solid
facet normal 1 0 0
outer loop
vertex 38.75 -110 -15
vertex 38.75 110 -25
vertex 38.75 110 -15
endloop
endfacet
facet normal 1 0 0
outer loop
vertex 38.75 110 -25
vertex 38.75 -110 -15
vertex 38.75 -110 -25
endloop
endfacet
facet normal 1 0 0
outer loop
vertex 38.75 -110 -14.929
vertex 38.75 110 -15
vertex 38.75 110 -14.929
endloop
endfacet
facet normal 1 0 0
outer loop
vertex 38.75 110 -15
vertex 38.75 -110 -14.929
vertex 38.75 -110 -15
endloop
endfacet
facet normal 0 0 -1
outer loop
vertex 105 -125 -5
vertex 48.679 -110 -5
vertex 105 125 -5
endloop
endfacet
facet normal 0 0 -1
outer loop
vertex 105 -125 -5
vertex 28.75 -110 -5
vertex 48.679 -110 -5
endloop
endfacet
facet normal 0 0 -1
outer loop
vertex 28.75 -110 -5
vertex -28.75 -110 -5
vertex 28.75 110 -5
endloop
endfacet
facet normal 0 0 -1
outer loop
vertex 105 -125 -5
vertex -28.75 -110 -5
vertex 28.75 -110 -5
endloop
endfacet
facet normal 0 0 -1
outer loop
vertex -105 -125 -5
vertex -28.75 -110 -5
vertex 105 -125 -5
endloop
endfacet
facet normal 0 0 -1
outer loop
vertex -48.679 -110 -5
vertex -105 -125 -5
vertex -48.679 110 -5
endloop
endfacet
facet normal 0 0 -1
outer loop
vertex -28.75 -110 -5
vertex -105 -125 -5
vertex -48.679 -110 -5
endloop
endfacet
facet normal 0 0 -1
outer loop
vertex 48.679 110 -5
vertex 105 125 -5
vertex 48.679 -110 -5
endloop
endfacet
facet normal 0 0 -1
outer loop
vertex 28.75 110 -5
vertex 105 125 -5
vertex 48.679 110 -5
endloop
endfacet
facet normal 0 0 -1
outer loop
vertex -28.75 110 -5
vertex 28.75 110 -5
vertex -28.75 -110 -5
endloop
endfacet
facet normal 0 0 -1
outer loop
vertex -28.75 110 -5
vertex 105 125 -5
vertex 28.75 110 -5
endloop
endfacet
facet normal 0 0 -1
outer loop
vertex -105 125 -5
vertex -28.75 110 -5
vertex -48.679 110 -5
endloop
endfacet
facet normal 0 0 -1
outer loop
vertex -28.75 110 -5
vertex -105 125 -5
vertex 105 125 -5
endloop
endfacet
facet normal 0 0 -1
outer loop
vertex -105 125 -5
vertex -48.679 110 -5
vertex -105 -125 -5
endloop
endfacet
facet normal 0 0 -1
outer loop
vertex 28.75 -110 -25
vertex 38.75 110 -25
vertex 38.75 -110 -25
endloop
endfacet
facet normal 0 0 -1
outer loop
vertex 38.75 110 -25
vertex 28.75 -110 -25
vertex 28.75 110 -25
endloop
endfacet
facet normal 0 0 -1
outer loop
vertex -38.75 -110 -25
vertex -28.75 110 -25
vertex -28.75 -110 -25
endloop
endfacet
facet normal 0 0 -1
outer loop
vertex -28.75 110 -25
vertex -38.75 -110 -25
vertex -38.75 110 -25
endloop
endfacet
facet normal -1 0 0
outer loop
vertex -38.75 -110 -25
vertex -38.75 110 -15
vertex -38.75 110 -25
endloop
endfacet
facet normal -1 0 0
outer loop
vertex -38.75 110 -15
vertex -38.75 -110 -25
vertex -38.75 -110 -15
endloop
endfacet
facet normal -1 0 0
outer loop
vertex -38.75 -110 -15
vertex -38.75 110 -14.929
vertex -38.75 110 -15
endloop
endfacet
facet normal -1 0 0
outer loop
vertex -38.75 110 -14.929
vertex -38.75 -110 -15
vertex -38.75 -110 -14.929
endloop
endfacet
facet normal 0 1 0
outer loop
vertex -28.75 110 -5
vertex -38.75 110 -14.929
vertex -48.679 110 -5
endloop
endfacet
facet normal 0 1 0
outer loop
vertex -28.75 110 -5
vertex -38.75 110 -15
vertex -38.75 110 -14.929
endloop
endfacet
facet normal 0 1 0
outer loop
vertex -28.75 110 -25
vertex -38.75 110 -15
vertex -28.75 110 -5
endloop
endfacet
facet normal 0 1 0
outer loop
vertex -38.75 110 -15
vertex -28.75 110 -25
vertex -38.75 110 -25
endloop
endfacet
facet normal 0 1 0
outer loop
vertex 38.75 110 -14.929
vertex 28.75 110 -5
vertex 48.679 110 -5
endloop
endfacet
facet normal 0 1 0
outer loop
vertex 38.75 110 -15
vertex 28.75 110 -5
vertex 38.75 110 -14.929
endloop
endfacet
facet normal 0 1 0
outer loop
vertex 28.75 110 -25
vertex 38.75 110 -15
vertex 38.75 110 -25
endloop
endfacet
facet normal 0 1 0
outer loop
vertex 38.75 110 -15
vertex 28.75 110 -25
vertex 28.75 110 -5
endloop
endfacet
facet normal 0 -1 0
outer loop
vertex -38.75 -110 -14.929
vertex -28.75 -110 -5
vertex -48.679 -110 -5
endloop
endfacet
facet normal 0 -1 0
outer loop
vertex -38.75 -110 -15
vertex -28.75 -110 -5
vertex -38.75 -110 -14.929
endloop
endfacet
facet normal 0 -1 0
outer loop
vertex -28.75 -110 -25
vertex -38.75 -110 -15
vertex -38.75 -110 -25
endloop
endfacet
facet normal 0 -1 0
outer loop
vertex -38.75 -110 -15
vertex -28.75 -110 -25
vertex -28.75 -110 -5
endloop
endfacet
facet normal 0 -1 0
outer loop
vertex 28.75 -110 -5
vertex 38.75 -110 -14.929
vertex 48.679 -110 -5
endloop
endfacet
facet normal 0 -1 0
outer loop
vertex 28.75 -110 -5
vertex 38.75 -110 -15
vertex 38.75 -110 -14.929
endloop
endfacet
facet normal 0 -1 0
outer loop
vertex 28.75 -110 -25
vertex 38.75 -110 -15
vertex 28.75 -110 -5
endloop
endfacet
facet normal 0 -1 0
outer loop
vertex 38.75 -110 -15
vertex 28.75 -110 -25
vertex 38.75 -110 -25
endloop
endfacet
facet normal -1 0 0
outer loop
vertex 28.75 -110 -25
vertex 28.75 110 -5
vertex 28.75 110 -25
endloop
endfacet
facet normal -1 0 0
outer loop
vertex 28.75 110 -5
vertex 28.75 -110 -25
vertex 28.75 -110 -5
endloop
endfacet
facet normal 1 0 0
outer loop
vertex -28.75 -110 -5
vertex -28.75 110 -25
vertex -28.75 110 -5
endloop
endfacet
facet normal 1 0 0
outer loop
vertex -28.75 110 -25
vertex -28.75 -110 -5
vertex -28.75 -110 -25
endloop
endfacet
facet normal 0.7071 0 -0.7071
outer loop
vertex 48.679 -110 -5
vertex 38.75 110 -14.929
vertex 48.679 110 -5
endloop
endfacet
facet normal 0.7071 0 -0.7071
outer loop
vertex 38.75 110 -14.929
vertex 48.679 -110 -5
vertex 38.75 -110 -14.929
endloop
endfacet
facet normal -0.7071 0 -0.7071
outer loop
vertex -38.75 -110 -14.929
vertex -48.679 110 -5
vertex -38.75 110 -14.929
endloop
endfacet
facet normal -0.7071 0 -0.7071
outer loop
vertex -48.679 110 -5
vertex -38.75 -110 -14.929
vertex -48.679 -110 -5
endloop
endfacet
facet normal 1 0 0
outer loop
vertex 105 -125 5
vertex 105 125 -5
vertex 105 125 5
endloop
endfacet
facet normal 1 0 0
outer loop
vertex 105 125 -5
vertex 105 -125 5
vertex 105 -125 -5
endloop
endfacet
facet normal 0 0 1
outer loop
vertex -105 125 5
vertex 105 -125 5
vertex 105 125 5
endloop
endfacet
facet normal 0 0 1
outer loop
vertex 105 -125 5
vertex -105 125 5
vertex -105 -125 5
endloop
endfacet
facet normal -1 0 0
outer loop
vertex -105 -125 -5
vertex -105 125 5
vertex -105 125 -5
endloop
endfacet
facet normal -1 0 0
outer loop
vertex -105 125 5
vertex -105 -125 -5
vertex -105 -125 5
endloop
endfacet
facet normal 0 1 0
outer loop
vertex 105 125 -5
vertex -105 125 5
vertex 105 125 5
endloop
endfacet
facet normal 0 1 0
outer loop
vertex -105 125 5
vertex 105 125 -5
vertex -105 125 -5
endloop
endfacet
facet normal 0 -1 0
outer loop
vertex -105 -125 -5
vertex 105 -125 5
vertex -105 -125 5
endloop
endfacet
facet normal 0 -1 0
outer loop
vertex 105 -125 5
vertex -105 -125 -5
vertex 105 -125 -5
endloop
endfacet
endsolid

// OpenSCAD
//shelf for vactrap 2 to fit on support leg of Baker Co biosafety cabinet
//vactrap 2 260mm x 200mm

//base plate
cube(size = [210,250,10], center = true);

//support channel
translate([0,0,-15]){
  difference() {
    color("blue")
    cube(size = [77.5,220,20], center = true);
    cube(size = [57.5,230,20], center = true);
  }
}

//buttresses
module buttress(rot) {
  translate([rot*43.75,0,-10]){
    color("yellow")
    difference() {
      cube(size = [10,220,10], center = true);
      translate([rot*3.5,0,-3.5]){
        rotate(a =[0,rot*-45,0]){
        cube(size = [sqrt(200),220,10], center = true);
        }
      }
    }
  }
}

buttress(rot=1);
buttress(rot=-1);
